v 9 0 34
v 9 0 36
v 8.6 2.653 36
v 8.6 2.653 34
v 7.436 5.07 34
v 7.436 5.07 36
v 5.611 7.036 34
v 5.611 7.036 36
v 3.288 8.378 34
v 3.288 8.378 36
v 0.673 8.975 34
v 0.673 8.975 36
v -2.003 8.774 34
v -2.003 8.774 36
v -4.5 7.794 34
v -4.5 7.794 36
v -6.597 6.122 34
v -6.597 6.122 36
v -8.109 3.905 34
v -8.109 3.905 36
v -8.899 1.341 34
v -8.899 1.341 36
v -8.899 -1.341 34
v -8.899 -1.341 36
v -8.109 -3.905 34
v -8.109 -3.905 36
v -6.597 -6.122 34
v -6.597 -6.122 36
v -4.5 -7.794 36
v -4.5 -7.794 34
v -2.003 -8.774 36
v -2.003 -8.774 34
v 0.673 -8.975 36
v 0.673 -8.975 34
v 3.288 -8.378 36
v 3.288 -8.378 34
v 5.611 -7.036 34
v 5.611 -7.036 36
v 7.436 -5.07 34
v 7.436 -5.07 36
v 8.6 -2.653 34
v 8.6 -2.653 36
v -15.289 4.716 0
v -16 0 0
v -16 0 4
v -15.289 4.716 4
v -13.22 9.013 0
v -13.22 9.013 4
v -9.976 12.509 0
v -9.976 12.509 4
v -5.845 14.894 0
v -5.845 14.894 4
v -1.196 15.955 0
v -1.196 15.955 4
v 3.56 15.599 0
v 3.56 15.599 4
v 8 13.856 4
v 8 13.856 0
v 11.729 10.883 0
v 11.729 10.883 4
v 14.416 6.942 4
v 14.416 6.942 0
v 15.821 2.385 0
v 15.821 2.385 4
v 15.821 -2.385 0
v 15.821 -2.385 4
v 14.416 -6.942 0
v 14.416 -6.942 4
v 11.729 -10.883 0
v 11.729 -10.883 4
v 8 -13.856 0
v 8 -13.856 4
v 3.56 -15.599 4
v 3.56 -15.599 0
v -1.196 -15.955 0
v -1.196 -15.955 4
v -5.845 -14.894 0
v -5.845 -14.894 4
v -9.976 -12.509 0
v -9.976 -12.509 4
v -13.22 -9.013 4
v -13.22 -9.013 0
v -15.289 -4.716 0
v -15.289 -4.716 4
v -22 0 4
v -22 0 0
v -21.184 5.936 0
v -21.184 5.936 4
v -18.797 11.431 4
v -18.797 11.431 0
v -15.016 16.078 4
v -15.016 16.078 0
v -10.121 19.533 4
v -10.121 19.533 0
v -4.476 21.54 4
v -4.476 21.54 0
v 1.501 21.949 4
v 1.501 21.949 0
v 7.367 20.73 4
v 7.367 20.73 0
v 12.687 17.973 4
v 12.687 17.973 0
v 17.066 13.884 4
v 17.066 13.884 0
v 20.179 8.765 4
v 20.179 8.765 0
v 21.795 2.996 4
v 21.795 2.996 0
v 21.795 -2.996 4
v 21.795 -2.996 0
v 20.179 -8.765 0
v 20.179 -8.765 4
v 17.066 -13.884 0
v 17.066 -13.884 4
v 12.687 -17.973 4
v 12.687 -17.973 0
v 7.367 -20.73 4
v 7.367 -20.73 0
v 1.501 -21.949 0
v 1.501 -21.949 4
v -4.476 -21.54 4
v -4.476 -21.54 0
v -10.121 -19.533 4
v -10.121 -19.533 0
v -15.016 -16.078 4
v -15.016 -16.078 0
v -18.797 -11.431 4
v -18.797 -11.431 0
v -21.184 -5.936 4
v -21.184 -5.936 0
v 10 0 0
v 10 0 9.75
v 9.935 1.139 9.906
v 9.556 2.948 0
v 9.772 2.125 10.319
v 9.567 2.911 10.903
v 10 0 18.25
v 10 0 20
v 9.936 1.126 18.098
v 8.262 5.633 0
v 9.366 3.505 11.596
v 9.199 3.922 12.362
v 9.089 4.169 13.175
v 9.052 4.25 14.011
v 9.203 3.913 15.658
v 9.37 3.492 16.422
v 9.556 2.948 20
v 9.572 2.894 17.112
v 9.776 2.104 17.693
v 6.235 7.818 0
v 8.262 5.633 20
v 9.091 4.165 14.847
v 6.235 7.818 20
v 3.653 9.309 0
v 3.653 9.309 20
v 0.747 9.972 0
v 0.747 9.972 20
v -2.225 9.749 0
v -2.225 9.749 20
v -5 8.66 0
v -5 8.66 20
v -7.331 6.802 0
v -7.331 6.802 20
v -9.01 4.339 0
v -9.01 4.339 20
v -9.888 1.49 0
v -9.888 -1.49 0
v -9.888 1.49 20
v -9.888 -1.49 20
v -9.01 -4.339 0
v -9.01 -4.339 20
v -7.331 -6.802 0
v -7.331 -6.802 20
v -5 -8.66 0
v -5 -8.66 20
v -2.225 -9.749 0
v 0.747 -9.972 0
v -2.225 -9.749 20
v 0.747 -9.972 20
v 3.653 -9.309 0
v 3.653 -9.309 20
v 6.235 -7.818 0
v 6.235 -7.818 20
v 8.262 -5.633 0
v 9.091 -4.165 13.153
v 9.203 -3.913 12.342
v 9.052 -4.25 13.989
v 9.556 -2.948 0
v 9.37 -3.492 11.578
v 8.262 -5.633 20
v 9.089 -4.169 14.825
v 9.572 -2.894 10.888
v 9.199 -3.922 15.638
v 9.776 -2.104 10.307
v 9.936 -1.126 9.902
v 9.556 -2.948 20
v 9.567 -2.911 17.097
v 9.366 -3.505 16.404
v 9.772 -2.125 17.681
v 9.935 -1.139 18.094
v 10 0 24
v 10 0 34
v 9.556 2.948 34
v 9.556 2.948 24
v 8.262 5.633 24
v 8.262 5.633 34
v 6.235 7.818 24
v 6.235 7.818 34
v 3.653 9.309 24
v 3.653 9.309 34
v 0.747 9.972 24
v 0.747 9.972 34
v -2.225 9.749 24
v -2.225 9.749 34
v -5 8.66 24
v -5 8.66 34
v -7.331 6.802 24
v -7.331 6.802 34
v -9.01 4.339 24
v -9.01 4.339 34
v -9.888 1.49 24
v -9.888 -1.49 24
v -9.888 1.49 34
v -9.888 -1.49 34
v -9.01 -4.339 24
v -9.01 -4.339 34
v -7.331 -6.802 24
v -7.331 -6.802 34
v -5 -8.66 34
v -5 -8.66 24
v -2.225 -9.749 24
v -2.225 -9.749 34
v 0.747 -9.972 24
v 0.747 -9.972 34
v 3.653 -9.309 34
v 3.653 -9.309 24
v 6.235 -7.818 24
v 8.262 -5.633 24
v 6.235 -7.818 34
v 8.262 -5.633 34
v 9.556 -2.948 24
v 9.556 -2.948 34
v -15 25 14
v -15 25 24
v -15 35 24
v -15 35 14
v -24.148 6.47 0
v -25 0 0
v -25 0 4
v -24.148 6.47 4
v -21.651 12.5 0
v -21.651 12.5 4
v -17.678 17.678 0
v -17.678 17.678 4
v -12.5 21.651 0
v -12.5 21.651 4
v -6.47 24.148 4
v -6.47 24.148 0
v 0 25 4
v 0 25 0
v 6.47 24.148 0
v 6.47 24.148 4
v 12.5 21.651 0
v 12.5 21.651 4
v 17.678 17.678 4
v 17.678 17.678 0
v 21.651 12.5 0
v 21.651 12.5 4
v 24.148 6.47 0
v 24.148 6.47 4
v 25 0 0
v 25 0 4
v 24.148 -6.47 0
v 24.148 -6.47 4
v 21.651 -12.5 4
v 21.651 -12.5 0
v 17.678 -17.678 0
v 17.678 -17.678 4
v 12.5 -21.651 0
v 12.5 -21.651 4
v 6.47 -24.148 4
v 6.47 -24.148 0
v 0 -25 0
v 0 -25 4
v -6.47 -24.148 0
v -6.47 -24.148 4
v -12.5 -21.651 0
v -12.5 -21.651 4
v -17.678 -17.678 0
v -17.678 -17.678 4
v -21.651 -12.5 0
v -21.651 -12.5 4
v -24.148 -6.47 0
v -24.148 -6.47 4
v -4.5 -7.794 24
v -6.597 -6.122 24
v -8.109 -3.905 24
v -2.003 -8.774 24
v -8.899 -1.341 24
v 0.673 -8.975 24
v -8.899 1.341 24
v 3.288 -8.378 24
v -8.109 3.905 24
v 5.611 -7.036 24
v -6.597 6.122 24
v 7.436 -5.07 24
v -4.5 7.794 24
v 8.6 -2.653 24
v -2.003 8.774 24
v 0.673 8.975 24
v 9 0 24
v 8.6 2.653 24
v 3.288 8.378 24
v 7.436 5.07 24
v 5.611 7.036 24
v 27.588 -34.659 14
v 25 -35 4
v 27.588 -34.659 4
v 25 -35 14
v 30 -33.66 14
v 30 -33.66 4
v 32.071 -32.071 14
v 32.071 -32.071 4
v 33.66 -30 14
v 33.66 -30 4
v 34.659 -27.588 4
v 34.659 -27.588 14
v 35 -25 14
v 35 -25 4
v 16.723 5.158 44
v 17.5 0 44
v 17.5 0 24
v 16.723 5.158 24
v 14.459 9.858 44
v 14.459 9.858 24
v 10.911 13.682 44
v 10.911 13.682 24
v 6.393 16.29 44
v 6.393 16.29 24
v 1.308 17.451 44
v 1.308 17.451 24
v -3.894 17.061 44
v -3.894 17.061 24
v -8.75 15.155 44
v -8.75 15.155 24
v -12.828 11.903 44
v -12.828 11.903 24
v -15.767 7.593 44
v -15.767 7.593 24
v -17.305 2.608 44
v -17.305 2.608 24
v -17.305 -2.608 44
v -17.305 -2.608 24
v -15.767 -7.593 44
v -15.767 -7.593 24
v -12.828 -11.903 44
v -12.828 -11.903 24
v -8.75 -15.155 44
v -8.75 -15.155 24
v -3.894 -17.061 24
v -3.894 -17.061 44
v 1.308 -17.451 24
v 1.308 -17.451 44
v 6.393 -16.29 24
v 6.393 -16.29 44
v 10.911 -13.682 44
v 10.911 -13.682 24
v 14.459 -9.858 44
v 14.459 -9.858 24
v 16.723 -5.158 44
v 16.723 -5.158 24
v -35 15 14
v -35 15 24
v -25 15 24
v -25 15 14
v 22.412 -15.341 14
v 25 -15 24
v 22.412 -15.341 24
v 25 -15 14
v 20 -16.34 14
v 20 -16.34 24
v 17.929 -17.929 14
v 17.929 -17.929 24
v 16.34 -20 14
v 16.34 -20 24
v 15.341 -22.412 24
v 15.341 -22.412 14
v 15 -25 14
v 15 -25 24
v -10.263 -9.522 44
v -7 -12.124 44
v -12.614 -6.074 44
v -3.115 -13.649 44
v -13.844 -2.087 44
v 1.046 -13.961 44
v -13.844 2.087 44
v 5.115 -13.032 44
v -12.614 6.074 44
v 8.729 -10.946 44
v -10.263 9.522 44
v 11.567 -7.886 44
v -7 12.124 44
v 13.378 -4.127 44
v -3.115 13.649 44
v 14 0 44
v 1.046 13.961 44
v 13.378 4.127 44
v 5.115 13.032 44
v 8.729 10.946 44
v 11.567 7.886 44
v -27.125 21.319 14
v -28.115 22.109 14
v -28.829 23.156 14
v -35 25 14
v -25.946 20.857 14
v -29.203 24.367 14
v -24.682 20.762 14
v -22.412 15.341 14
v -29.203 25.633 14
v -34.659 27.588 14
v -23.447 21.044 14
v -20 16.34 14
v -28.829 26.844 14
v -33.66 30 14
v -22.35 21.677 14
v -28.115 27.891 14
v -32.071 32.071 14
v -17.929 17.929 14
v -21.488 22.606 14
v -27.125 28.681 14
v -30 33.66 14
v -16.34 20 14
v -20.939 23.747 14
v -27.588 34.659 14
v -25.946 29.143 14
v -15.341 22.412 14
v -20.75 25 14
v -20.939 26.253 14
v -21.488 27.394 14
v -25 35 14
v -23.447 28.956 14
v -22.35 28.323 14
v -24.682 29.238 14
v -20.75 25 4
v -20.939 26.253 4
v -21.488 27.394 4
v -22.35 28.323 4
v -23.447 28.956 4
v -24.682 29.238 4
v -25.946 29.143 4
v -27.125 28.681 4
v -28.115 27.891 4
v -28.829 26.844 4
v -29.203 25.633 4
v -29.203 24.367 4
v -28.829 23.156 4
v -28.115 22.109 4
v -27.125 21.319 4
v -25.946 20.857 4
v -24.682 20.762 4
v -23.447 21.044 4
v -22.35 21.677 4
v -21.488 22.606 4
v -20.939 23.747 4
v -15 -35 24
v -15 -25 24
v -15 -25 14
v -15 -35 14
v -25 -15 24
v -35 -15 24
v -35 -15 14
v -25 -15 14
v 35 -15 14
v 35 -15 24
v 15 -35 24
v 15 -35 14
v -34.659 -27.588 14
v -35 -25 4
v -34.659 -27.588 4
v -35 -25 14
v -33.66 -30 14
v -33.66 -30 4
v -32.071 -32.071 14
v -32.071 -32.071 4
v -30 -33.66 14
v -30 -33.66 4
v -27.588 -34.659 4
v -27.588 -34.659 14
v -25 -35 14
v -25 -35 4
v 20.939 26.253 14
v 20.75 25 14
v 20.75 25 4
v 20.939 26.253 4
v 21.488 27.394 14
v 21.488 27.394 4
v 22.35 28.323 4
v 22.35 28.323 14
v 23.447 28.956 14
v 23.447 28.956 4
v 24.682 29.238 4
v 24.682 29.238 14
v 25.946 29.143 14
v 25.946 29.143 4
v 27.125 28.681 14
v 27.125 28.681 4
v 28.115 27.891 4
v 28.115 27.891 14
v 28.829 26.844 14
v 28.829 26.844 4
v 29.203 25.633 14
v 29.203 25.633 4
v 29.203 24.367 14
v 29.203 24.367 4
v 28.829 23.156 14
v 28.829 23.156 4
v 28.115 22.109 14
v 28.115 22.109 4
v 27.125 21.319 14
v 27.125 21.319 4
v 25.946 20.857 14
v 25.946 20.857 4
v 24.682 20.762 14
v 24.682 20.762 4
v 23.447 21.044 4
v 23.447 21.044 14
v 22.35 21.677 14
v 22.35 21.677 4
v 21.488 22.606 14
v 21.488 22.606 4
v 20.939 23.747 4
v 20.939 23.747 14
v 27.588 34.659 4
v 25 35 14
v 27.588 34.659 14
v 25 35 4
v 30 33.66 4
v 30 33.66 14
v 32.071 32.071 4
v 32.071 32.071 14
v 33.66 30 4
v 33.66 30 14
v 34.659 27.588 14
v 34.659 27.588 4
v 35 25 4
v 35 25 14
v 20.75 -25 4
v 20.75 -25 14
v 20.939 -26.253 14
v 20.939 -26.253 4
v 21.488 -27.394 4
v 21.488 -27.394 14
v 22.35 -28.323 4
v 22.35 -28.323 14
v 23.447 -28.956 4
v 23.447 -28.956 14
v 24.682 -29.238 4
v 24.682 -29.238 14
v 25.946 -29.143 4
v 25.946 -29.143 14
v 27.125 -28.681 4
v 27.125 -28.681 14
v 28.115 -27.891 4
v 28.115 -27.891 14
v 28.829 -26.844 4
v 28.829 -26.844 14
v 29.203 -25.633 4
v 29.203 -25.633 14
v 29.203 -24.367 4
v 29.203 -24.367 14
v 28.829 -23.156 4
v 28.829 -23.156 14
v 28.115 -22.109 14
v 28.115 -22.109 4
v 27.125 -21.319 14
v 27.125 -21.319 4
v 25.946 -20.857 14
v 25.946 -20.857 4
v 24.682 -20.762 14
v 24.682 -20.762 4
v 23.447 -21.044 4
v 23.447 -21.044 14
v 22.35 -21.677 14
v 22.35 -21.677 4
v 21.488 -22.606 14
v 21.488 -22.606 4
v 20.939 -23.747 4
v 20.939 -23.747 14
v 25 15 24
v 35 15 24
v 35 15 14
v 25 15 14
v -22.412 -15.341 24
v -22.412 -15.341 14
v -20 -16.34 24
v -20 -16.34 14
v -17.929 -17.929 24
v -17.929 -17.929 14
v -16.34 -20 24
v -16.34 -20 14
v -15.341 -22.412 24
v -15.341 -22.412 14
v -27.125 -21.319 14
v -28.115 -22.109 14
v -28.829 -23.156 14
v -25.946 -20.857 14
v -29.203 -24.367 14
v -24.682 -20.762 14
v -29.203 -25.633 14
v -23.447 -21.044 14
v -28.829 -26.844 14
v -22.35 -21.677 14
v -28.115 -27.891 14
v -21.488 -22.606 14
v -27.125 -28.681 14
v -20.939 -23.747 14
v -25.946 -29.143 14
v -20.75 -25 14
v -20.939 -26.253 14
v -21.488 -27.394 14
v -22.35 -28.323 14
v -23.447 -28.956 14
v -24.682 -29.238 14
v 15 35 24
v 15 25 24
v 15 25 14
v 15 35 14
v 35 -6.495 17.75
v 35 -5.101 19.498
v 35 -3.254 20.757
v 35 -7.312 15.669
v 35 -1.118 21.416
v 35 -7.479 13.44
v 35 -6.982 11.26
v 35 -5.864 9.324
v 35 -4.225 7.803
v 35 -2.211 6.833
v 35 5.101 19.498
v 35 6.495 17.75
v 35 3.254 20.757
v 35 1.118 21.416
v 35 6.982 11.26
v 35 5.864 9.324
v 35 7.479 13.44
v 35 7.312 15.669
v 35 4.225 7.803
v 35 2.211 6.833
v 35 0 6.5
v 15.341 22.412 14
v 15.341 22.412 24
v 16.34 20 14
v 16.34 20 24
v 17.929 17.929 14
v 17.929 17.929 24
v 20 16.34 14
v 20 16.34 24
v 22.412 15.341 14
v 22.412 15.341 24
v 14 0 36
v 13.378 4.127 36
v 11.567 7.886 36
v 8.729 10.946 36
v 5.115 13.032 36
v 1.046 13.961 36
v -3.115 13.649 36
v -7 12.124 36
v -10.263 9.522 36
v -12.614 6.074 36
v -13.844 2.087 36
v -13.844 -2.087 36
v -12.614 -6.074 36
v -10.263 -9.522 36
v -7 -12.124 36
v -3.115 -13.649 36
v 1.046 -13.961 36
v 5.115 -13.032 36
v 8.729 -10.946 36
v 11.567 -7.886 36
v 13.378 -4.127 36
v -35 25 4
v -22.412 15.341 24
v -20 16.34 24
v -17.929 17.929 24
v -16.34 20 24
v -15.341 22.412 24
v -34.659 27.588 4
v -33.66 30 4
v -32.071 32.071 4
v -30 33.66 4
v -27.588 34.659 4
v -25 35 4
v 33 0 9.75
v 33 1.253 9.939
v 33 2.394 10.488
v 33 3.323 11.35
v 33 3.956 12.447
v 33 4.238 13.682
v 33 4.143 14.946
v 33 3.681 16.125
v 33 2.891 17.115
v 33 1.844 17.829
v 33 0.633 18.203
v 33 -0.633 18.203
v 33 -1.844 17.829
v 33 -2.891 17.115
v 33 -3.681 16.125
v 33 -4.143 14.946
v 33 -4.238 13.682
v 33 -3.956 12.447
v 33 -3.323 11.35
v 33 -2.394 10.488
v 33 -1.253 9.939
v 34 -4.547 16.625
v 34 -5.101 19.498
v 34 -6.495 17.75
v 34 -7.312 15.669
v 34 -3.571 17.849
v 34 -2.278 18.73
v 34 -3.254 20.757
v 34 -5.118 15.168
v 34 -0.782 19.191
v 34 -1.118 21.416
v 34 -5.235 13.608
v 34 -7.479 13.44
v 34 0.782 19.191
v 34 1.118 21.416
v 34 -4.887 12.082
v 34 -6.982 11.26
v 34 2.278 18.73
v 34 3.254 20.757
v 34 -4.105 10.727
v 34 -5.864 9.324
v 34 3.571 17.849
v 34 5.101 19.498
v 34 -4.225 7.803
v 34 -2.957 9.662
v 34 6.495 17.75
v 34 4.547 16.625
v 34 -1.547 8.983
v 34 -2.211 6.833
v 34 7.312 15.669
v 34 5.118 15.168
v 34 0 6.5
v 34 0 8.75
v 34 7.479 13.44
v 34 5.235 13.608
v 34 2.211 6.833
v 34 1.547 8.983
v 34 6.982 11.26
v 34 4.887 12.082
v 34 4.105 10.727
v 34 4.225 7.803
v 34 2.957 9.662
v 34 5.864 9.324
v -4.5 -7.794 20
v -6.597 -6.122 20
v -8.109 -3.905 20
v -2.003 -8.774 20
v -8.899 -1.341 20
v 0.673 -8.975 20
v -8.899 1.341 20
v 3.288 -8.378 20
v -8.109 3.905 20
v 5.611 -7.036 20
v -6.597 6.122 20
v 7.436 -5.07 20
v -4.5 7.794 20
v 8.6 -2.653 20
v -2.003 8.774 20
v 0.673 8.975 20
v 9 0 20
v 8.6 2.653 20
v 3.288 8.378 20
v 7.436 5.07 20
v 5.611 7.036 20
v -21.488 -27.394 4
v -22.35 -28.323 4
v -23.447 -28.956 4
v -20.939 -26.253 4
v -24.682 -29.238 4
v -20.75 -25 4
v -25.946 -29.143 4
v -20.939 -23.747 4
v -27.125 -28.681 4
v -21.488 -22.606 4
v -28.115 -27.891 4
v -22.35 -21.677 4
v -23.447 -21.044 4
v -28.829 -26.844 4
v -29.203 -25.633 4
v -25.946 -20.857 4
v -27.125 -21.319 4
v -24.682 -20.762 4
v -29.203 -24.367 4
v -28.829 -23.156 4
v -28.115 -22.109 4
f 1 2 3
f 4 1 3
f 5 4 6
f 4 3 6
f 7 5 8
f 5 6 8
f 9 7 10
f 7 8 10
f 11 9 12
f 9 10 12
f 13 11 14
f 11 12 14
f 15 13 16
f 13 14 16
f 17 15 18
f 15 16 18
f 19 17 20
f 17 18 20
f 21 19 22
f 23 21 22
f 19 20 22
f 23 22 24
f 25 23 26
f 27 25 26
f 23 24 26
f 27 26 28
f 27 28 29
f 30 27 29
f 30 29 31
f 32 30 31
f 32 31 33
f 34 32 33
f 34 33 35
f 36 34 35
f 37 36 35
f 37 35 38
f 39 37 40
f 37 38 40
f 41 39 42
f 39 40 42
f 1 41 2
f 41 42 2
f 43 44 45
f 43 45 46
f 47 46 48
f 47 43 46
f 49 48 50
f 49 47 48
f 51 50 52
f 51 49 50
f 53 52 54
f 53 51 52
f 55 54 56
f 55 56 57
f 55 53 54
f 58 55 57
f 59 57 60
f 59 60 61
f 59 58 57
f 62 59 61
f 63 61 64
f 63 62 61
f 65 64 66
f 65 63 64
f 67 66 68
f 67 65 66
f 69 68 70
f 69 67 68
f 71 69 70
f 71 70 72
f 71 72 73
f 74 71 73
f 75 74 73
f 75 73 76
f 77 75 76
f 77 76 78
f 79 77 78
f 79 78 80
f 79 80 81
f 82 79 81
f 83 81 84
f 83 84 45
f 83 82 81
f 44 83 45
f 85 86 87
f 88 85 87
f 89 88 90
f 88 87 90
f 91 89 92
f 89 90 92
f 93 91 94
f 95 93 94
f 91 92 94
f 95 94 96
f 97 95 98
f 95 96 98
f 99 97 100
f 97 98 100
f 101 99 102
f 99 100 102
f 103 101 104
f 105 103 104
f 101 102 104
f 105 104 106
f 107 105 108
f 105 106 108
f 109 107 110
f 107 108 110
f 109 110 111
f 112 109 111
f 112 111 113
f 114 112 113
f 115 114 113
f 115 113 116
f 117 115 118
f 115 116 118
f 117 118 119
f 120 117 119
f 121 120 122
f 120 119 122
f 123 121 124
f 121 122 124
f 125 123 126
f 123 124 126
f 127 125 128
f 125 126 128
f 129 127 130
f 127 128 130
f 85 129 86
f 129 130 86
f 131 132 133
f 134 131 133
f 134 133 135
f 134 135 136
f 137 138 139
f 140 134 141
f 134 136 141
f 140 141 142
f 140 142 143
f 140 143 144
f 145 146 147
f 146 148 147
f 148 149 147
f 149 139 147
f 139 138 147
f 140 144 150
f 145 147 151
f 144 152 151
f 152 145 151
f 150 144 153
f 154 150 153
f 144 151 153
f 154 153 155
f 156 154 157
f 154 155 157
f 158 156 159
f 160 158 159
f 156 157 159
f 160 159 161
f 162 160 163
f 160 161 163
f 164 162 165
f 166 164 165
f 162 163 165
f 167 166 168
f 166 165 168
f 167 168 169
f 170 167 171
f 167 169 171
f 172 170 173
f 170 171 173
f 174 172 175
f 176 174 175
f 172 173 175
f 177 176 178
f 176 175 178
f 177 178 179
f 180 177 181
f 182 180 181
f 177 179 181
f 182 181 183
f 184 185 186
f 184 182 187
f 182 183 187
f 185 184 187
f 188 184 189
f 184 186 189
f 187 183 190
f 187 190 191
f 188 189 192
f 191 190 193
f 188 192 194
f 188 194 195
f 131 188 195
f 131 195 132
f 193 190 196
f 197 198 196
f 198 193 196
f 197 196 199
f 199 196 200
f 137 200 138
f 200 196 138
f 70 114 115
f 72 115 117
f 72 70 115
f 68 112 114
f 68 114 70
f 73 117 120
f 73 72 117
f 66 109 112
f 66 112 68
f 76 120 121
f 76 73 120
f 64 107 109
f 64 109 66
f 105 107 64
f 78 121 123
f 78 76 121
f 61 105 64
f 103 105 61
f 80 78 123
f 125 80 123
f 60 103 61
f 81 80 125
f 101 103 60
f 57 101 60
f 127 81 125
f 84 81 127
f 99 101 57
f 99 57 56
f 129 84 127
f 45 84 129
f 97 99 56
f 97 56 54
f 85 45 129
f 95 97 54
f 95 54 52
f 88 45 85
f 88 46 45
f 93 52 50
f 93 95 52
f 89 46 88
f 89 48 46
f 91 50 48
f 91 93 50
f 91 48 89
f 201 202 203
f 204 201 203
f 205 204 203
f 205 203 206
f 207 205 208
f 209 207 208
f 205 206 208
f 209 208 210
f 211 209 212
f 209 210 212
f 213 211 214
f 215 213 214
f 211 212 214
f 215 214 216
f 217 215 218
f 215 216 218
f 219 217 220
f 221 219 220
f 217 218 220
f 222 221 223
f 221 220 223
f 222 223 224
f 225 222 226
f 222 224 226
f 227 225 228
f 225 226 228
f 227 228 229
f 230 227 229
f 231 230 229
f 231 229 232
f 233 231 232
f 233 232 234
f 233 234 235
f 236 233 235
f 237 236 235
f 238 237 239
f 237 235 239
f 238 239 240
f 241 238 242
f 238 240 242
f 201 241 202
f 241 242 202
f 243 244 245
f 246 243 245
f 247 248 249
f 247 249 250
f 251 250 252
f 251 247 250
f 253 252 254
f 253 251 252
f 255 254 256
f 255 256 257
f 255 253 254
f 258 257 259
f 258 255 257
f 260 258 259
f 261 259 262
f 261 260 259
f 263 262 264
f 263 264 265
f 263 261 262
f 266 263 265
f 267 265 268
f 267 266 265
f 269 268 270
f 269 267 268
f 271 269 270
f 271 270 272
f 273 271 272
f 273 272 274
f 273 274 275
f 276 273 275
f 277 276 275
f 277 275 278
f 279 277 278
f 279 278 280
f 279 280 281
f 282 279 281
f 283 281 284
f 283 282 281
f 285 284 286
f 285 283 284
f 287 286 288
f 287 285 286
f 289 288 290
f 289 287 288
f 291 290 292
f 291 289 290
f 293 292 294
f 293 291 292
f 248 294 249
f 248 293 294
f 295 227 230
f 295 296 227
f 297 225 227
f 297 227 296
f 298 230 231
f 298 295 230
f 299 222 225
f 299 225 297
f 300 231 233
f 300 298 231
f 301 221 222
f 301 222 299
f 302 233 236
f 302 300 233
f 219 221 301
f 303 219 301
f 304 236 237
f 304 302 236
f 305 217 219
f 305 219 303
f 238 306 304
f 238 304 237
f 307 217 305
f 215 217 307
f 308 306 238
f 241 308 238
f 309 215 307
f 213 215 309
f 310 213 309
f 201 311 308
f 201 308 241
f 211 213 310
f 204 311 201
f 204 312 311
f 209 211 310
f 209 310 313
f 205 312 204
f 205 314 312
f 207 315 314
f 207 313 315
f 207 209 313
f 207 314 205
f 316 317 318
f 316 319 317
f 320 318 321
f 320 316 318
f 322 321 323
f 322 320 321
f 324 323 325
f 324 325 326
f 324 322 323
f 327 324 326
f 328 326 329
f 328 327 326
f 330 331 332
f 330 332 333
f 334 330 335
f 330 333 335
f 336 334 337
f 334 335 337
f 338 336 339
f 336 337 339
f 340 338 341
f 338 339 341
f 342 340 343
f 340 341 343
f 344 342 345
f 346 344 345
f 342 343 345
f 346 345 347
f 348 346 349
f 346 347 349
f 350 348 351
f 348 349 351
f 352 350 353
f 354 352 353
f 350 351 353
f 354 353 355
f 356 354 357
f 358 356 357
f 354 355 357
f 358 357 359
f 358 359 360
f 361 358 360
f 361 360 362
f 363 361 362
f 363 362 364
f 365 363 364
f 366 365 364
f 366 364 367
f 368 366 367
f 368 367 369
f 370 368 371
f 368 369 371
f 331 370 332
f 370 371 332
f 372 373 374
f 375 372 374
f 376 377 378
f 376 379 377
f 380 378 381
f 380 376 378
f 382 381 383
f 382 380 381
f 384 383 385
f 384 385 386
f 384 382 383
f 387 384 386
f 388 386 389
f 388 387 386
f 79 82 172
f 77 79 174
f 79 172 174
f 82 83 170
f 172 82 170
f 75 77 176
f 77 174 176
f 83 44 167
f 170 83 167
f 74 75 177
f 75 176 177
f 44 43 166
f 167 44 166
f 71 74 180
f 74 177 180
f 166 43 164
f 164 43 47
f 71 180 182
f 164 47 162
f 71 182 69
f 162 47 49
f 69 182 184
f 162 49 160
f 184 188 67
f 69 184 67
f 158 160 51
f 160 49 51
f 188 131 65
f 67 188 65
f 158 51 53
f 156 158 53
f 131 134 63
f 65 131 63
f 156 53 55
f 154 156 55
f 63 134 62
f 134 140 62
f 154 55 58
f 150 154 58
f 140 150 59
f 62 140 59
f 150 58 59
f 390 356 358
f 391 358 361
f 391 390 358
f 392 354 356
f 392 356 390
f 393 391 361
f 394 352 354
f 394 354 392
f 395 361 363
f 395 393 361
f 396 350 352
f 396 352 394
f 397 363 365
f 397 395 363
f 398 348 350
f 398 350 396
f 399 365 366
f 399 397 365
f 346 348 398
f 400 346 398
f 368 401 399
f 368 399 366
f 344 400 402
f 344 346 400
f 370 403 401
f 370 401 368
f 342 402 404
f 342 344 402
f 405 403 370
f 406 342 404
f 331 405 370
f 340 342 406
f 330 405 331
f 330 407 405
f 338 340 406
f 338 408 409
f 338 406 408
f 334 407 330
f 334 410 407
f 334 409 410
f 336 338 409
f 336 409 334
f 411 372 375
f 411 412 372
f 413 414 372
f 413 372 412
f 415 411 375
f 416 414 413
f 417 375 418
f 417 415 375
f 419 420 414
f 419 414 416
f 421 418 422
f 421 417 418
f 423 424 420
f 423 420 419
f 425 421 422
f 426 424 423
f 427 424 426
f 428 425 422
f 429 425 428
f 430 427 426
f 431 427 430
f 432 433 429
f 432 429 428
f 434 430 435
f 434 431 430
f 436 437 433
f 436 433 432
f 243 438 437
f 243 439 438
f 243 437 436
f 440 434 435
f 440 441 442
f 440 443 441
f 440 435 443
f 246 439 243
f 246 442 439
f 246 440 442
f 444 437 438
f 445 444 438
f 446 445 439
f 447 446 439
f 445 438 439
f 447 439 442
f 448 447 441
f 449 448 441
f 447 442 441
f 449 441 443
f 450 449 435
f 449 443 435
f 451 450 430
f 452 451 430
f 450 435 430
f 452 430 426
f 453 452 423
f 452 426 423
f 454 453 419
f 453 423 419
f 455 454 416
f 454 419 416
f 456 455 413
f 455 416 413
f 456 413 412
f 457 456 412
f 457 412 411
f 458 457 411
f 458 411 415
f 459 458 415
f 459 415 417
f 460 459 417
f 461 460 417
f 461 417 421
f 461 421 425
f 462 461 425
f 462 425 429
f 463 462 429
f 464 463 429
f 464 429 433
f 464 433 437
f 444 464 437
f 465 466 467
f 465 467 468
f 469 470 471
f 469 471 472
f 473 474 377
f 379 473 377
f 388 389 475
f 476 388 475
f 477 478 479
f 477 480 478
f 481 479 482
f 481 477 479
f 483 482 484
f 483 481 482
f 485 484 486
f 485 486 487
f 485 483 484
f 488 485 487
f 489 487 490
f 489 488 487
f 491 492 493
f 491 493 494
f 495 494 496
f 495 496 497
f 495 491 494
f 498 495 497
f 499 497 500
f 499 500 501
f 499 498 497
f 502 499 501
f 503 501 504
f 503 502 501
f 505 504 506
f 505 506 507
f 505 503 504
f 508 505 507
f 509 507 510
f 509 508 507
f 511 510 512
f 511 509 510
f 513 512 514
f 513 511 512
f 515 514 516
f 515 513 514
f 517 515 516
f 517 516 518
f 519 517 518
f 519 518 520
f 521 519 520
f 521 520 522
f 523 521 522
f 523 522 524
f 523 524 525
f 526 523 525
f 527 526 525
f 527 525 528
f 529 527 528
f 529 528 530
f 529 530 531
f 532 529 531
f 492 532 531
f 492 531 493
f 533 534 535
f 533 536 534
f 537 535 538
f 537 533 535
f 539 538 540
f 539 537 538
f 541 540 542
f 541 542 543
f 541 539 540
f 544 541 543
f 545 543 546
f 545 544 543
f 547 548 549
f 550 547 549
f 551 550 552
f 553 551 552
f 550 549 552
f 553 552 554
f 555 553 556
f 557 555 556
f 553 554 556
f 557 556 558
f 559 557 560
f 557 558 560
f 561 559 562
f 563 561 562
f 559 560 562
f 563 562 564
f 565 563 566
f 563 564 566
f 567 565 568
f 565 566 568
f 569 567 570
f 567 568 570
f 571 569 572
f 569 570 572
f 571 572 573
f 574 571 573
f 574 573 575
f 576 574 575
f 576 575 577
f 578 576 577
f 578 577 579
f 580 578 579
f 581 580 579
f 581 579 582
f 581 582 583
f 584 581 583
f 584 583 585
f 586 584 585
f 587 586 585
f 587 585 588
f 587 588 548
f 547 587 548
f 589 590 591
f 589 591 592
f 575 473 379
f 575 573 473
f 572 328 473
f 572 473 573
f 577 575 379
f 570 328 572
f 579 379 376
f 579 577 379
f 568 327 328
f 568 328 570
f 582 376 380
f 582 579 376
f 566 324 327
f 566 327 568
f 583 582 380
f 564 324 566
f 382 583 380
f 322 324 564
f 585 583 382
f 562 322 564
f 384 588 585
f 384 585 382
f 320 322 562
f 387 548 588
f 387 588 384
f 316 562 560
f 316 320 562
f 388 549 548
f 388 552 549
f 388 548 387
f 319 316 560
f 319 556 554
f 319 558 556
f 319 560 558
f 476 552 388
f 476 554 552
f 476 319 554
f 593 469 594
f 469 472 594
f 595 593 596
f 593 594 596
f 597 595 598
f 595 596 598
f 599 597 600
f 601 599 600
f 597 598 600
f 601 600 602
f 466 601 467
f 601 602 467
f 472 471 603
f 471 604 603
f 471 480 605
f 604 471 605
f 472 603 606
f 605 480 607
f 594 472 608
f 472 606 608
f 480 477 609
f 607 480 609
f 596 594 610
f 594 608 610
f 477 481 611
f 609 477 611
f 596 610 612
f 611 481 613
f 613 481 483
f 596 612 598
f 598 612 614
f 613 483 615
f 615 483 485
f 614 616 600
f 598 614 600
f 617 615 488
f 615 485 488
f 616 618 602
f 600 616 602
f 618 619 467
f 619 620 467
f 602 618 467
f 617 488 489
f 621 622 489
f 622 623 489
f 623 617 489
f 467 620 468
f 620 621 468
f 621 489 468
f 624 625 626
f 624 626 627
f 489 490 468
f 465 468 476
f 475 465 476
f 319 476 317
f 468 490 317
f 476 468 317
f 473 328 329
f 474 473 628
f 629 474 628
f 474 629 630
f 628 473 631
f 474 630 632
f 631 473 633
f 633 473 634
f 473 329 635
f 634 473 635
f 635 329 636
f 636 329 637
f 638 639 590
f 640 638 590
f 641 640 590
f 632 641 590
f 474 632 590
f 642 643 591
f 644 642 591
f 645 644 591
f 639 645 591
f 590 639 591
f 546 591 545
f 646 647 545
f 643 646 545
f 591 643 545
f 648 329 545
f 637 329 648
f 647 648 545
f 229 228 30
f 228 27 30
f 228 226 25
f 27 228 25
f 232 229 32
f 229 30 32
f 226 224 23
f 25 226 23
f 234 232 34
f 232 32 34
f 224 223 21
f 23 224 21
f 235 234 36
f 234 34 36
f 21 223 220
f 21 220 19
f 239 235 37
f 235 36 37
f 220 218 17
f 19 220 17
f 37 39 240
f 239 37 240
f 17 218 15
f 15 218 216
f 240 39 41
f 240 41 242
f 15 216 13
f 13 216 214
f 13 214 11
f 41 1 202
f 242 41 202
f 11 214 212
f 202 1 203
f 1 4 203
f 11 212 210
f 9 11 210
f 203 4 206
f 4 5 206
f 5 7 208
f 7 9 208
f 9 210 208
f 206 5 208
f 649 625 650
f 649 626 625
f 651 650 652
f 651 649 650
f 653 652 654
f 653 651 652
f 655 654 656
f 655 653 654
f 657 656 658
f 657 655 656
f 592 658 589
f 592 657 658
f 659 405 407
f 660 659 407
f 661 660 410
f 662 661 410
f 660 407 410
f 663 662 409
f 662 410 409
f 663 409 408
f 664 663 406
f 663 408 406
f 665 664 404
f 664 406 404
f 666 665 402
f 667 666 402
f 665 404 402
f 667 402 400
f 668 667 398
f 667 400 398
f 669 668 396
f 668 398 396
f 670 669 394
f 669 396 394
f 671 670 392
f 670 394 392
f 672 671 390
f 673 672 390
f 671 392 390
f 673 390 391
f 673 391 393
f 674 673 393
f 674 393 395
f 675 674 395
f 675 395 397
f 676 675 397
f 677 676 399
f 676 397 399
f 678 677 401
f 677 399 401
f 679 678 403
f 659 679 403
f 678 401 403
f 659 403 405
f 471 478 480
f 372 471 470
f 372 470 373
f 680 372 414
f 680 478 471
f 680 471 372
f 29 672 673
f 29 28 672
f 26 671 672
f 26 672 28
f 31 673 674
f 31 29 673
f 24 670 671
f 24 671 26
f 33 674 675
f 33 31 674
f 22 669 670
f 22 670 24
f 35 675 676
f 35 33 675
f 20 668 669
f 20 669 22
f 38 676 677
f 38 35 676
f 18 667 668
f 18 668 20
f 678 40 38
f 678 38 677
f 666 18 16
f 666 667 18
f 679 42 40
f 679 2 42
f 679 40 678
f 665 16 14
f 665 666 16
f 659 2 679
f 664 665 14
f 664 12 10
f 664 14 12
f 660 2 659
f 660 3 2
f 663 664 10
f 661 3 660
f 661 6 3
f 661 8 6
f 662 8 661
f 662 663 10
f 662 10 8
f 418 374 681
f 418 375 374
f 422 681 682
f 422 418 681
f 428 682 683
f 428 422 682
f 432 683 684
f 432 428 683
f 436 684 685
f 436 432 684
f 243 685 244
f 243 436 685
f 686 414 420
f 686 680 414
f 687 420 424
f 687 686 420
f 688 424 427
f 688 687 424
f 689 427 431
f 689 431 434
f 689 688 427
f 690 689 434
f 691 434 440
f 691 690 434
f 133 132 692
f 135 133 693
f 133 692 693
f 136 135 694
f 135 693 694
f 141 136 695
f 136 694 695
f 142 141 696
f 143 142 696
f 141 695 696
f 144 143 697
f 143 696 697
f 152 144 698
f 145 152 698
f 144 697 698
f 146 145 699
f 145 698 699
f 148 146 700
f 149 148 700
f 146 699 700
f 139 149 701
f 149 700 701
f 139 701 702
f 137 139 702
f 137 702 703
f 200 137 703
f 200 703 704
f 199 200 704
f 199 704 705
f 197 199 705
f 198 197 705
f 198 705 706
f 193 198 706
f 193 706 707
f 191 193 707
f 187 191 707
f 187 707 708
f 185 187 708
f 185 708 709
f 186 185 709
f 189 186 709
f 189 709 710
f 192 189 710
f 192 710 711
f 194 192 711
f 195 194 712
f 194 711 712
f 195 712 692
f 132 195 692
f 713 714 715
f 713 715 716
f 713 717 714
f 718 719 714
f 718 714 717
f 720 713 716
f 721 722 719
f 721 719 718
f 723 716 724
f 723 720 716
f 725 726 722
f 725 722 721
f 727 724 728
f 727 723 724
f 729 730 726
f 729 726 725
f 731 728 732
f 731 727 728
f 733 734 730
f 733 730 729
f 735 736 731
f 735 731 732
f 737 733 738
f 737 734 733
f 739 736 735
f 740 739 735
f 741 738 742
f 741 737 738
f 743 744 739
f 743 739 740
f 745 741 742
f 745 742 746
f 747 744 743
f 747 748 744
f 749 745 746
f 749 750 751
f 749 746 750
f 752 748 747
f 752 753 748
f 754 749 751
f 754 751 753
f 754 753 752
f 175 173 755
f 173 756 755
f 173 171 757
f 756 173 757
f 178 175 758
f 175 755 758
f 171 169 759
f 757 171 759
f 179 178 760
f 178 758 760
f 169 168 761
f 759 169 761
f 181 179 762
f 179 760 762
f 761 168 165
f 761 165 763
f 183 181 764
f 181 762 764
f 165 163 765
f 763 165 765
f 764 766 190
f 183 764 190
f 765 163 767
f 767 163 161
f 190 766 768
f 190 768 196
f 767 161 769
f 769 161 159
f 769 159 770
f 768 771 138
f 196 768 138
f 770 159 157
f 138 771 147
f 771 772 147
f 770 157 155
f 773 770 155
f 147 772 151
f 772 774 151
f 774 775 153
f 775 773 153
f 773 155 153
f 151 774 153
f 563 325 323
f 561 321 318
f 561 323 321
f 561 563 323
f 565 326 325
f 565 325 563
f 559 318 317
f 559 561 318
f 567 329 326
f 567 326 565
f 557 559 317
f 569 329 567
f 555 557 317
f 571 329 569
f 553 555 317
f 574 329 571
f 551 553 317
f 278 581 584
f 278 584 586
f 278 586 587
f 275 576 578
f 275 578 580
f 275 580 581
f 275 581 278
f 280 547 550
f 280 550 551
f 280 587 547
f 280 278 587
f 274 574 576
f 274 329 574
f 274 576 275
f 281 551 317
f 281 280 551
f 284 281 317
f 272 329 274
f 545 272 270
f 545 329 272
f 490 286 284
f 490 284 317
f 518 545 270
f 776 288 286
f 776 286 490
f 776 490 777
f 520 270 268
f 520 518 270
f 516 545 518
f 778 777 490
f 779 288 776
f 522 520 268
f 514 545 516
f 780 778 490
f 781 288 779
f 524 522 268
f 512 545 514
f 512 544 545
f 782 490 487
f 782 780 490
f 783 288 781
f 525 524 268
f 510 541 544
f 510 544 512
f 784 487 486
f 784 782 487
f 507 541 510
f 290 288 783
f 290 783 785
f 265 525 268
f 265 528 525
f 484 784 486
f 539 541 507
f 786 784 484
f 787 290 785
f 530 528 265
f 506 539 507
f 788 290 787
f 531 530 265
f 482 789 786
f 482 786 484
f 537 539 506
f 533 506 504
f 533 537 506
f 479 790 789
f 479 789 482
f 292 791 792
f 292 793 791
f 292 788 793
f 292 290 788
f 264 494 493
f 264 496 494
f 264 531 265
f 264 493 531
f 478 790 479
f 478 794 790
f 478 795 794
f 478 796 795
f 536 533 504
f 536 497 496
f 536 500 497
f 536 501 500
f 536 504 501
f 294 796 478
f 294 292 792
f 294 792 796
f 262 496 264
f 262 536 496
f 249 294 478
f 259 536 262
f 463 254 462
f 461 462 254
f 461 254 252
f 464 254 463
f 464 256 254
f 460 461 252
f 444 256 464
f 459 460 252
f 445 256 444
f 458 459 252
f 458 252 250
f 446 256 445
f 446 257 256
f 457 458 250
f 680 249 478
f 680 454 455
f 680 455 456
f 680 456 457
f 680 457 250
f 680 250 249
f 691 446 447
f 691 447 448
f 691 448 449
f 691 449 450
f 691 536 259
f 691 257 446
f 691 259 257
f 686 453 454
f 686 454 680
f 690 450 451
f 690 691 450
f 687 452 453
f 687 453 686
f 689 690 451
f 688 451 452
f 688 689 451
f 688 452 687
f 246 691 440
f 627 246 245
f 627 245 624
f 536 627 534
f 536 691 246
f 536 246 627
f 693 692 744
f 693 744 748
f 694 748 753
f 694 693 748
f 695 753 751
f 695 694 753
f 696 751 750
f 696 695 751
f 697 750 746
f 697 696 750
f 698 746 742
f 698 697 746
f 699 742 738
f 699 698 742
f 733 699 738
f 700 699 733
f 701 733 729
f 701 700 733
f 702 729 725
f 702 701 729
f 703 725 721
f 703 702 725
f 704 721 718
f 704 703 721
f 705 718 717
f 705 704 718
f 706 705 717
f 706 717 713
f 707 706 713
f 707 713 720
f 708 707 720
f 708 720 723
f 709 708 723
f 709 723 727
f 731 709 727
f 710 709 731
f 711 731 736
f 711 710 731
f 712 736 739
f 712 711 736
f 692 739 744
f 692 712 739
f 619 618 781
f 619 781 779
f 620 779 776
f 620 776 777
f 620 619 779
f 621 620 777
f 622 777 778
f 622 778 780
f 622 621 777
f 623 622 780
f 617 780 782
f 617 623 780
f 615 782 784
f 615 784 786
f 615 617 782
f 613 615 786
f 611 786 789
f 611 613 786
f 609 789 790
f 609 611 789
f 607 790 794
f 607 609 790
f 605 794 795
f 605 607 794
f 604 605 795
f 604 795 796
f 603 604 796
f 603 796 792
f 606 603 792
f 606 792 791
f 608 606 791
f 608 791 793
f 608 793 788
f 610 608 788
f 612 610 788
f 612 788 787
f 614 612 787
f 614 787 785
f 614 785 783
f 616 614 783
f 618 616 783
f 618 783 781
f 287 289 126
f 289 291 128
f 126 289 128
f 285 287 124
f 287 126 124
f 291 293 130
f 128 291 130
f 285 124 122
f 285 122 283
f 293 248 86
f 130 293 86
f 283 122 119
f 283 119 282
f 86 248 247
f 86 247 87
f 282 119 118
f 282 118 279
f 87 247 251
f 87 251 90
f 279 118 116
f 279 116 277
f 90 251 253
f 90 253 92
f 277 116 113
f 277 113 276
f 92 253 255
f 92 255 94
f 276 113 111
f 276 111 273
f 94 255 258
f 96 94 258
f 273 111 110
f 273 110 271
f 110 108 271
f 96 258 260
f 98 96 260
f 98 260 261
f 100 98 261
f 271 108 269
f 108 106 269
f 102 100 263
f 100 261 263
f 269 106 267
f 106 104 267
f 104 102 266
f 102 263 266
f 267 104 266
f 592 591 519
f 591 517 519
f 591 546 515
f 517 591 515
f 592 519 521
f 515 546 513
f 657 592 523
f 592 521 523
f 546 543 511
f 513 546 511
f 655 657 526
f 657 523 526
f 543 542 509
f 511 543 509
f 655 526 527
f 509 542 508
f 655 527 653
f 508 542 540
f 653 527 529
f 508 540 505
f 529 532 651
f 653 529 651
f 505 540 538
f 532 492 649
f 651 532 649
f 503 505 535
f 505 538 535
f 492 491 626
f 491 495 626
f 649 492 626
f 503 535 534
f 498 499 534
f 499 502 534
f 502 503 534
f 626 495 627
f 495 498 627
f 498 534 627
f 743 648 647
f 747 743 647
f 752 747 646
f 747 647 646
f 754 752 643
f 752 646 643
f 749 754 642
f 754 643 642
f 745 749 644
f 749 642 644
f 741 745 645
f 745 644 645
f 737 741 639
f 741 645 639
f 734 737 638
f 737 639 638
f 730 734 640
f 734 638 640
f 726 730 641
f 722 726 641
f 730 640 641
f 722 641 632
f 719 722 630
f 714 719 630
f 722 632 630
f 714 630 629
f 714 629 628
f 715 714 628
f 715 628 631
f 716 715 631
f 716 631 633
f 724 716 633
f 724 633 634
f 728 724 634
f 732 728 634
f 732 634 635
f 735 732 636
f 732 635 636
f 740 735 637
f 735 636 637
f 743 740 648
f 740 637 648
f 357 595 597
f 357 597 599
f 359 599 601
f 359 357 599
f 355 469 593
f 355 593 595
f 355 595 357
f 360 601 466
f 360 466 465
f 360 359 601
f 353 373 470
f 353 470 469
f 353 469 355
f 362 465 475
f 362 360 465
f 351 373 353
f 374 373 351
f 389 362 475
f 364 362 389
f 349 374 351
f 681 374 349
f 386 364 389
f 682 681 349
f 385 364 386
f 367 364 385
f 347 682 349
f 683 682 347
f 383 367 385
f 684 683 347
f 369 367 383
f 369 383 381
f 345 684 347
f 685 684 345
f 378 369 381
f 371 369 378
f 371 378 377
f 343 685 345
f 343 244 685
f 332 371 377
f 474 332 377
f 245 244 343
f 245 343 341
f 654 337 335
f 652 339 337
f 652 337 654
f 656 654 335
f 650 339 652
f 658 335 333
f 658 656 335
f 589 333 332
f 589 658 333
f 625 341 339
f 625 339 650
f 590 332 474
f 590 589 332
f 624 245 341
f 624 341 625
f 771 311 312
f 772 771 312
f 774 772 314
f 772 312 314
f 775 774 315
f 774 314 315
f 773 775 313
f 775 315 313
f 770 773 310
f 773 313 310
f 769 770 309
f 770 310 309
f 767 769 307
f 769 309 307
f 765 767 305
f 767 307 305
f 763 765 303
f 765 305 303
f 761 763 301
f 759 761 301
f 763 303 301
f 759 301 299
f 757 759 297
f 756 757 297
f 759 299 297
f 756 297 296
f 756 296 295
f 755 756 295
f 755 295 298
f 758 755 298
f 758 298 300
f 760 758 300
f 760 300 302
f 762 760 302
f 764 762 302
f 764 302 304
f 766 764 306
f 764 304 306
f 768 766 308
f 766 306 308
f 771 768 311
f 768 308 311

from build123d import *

# Parameters (mm, degrees)
SKETCH2_W               = 70
SKETCH2_H               = 70
BOSS_EXTRUDE1_DEPTH     = 24
SKETCH3_R               = 55
SKETCH3_W               = 70
SKETCH3_H               = 70
SKETCH3_R_2             = 22
SKETCH3_R_3             = 16
CUT_EXTRUDE1_DEPTH      = 4
SKETCH3_3_W             = 70
SKETCH3_3_H             = 70
SKETCH3_3_R             = 25
CUT_EXTRUDE2_DEPTH      = 4
SKETCH4_W               = 20
SKETCH4_H               = 20
SKETCH4_R               = 4.25
CUT_EXTRUDE3_DEPTH      = 10
CUT_EXTRUDE4_REACH      = 57.009
SKETCH4_3_R             = 4.25
MIRROR2_COPY_1_SKETCH_W = 20
MIRROR2_COPY_1_SKETCH_H = 20
MIRROR2_COPY_1_SKETCH_R = 4.25
MIRROR2_COPY_1_DEPTH    = 10
MIRROR2_COPY_2_REACH    = 57.009
MIRROR2_COPY_2_SKETCH_R = 4.25
FILLET1_R               = 10
SKETCH5_R               = 17.5
BOSS_EXTRUDE2_DEPTH     = 20
SKETCH6_R               = 14
CUT_EXTRUDE5_DEPTH      = 8
SKETCH7_R               = 9
CUT_EXTRUDE6_DEPTH      = 2
SKETCH8_R               = 10
CUT_EXTRUDE7_DEPTH      = 10
SKETCH9_R               = 9
CUT_EXTRUDE8_DEPTH      = 4
SKETCH10_R              = 10
CUT_EXTRUDE9_DEPTH      = 20
SKETCH11_R              = 7.5
CUT_EXTRUDE10_DEPTH     = 1
M10_TAPPED_HOLE1_REACH  = 91.006
M10_TAPPED_HOLE1_BORE_R = 4.25
CHAMFER1_SIZE           = 1


with BuildPart() as part:
    # Sketch2 → Boss-Extrude1 (new body)
    with BuildSketch(Plane.XY):
        Rectangle(SKETCH2_W, SKETCH2_H)
    extrude(amount=BOSS_EXTRUDE1_DEPTH)

    # Sketch3 → Cut-Extrude1 (cut)
    # profile 1 of 2: a face of its own
    with BuildSketch(Plane(origin=(0, 0, 0), x_dir=(-1, 0, 0), z_dir=(0, 0, -1))):
        Circle(SKETCH3_R)
        Rectangle(SKETCH3_W, SKETCH3_H, mode=Mode.SUBTRACT)
    # profile 2 of 2: a face of its own
    with BuildSketch(Plane(origin=(0, 0, 0), x_dir=(-1, 0, 0), z_dir=(0, 0, -1))):
        Circle(SKETCH3_R_2)
        Circle(SKETCH3_R_3, mode=Mode.SUBTRACT)
    extrude(amount=-CUT_EXTRUDE1_DEPTH, mode=Mode.SUBTRACT)

    # Sketch3<3> → Cut-Extrude2 (cut)
    with BuildSketch(Plane(origin=(0, 0, 0), x_dir=(-1, 0, 0), z_dir=(0, 0, -1))):
        Rectangle(SKETCH3_3_W, SKETCH3_3_H)
        Circle(SKETCH3_3_R, mode=Mode.SUBTRACT)
    extrude(amount=-CUT_EXTRUDE2_DEPTH, mode=Mode.SUBTRACT)

    # Sketch4 → Cut-Extrude3 (cut)
    with BuildSketch(Plane.XY.offset(24)):
        with Locations((-25, 25)):
            Rectangle(SKETCH4_W, SKETCH4_H)
        with Locations((-25, 25)):
            Circle(SKETCH4_R, mode=Mode.SUBTRACT)
    cut_extrude3 = extrude(amount=-CUT_EXTRUDE3_DEPTH, mode=Mode.SUBTRACT)

    # Sketch4<3> → Cut-Extrude4 (cut, up to next)
    with BuildSketch(Plane.XY.offset(24), mode=Mode.PRIVATE) as cut_extrude4_sk1:
        with Locations((-25, 25)):
            Circle(SKETCH4_3_R)
    cut_extrude4_tool1 = extrude(cut_extrude4_sk1.sketch, amount=-CUT_EXTRUDE4_REACH, mode=Mode.PRIVATE) & part.part
    cut_extrude4 = cut_extrude4_tool1.solids().sort_by_distance((-25, 25, 24))[0]
    add(cut_extrude4, mode=Mode.SUBTRACT)

    # Mirror1: Cut-Extrude3, Cut-Extrude4 across plane
    add(cut_extrude3.mirror(Plane.ZX), mode=Mode.SUBTRACT)
    add(cut_extrude4.mirror(Plane.ZX), mode=Mode.SUBTRACT)

    # Mirror2: Cut-Extrude3, Cut-Extrude4 across plane
    add(cut_extrude3.mirror(Plane(origin=(0, 0, 0), x_dir=(0, 0, 1), z_dir=(1, 0, 0))), mode=Mode.SUBTRACT)
    add(cut_extrude4.mirror(Plane(origin=(0, 0, 0), x_dir=(0, 0, 1), z_dir=(1, 0, 0))), mode=Mode.SUBTRACT)

    # Mirror2 copy 1 sketch → Mirror2 copy 1 (cut)
    with BuildSketch(Plane(origin=(0, 0, 24), x_dir=(-1, 0, 0), z_dir=(0, 0, 1))):
        with Locations((-25, 25)):
            Rectangle(MIRROR2_COPY_1_SKETCH_W, MIRROR2_COPY_1_SKETCH_H)
        with Locations((-25, 25)):
            Circle(MIRROR2_COPY_1_SKETCH_R, mode=Mode.SUBTRACT)
    extrude(amount=-MIRROR2_COPY_1_DEPTH, mode=Mode.SUBTRACT)

    # Mirror2 copy 2 sketch → Mirror2 copy 2 (cut, up to next)
    with BuildSketch(Plane(origin=(0, 0, 24), x_dir=(-1, 0, 0), z_dir=(0, 0, 1)), mode=Mode.PRIVATE) as mirror2_copy_2_sk1:
        with Locations((-25, 25)):
            Circle(MIRROR2_COPY_2_SKETCH_R)
    mirror2_copy_2_tool1 = extrude(mirror2_copy_2_sk1.sketch, amount=-MIRROR2_COPY_2_REACH, mode=Mode.PRIVATE) & part.part
    add(mirror2_copy_2_tool1.solids().sort_by_distance((25, -25, 24))[0], mode=Mode.SUBTRACT)

    # Fillet1
    fillet1_edges = [part.edges().sort_by_distance(p)[0] for p in [
        (35, -35, 9),
        (15, -15, 19),
        (-35, 35, 9),
        (-15, 15, 19),
        (-35, -35, 9),
        (-15, -15, 19),
        (35, 35, 9),
        (15, 15, 19),
    ]]
    fillet(fillet1_edges, radius=FILLET1_R)

    # Sketch5 → Boss-Extrude2 (add)
    with BuildSketch(Plane.XY.offset(24)):
        Circle(SKETCH5_R)
    extrude(amount=BOSS_EXTRUDE2_DEPTH)

    # Sketch6 → Cut-Extrude5 (cut)
    with BuildSketch(Plane.XY.offset(44)):
        Circle(SKETCH6_R)
    extrude(amount=-CUT_EXTRUDE5_DEPTH, mode=Mode.SUBTRACT)

    # Sketch7 → Cut-Extrude6 (cut)
    with BuildSketch(Plane.XY.offset(36)):
        Circle(SKETCH7_R)
    extrude(amount=-CUT_EXTRUDE6_DEPTH, mode=Mode.SUBTRACT)

    # Sketch8 → Cut-Extrude7 (cut)
    with BuildSketch(Plane.XY.offset(34)):
        Circle(SKETCH8_R)
    extrude(amount=-CUT_EXTRUDE7_DEPTH, mode=Mode.SUBTRACT)

    # Sketch9 → Cut-Extrude8 (cut)
    with BuildSketch(Plane.XY.offset(24)):
        Circle(SKETCH9_R)
    extrude(amount=-CUT_EXTRUDE8_DEPTH, mode=Mode.SUBTRACT)

    # Sketch10 → Cut-Extrude9 (cut)
    with BuildSketch(Plane.XY.offset(20)):
        Circle(SKETCH10_R)
    extrude(amount=-CUT_EXTRUDE9_DEPTH, mode=Mode.SUBTRACT)

    # Sketch11 → Cut-Extrude10 (cut)
    with BuildSketch(Plane(origin=(35, 0, 0), x_dir=(0, 0, -1), z_dir=(1, 0, 0))):
        with Locations((-14, 0)):
            Circle(SKETCH11_R)
    extrude(amount=-CUT_EXTRUDE10_DEPTH, mode=Mode.SUBTRACT)

    # M10 Tapped Hole1 bore → M10 Tapped Hole1 (cut, up to next)
    with BuildSketch(Plane(origin=(34, 0, 0), x_dir=(0, 0, -1), z_dir=(1, 0, 0)), mode=Mode.PRIVATE) as m10_tapped_hole1_sk1:
        with Locations((-14, 0)):
            Circle(M10_TAPPED_HOLE1_BORE_R)
    m10_tapped_hole1_tool1 = extrude(m10_tapped_hole1_sk1.sketch, amount=-M10_TAPPED_HOLE1_REACH, mode=Mode.PRIVATE) & part.part
    add(m10_tapped_hole1_tool1.solids().sort_by_distance((34, 0, 14))[0], mode=Mode.SUBTRACT)

    # Chamfer1
    chamfer1_edges = [part.edges().sort_by_distance(p)[0] for p in [
        (34, 0, 18.25),
    ]]
    chamfer(chamfer1_edges, length=CHAMFER1_SIZE)


solid = part.part
